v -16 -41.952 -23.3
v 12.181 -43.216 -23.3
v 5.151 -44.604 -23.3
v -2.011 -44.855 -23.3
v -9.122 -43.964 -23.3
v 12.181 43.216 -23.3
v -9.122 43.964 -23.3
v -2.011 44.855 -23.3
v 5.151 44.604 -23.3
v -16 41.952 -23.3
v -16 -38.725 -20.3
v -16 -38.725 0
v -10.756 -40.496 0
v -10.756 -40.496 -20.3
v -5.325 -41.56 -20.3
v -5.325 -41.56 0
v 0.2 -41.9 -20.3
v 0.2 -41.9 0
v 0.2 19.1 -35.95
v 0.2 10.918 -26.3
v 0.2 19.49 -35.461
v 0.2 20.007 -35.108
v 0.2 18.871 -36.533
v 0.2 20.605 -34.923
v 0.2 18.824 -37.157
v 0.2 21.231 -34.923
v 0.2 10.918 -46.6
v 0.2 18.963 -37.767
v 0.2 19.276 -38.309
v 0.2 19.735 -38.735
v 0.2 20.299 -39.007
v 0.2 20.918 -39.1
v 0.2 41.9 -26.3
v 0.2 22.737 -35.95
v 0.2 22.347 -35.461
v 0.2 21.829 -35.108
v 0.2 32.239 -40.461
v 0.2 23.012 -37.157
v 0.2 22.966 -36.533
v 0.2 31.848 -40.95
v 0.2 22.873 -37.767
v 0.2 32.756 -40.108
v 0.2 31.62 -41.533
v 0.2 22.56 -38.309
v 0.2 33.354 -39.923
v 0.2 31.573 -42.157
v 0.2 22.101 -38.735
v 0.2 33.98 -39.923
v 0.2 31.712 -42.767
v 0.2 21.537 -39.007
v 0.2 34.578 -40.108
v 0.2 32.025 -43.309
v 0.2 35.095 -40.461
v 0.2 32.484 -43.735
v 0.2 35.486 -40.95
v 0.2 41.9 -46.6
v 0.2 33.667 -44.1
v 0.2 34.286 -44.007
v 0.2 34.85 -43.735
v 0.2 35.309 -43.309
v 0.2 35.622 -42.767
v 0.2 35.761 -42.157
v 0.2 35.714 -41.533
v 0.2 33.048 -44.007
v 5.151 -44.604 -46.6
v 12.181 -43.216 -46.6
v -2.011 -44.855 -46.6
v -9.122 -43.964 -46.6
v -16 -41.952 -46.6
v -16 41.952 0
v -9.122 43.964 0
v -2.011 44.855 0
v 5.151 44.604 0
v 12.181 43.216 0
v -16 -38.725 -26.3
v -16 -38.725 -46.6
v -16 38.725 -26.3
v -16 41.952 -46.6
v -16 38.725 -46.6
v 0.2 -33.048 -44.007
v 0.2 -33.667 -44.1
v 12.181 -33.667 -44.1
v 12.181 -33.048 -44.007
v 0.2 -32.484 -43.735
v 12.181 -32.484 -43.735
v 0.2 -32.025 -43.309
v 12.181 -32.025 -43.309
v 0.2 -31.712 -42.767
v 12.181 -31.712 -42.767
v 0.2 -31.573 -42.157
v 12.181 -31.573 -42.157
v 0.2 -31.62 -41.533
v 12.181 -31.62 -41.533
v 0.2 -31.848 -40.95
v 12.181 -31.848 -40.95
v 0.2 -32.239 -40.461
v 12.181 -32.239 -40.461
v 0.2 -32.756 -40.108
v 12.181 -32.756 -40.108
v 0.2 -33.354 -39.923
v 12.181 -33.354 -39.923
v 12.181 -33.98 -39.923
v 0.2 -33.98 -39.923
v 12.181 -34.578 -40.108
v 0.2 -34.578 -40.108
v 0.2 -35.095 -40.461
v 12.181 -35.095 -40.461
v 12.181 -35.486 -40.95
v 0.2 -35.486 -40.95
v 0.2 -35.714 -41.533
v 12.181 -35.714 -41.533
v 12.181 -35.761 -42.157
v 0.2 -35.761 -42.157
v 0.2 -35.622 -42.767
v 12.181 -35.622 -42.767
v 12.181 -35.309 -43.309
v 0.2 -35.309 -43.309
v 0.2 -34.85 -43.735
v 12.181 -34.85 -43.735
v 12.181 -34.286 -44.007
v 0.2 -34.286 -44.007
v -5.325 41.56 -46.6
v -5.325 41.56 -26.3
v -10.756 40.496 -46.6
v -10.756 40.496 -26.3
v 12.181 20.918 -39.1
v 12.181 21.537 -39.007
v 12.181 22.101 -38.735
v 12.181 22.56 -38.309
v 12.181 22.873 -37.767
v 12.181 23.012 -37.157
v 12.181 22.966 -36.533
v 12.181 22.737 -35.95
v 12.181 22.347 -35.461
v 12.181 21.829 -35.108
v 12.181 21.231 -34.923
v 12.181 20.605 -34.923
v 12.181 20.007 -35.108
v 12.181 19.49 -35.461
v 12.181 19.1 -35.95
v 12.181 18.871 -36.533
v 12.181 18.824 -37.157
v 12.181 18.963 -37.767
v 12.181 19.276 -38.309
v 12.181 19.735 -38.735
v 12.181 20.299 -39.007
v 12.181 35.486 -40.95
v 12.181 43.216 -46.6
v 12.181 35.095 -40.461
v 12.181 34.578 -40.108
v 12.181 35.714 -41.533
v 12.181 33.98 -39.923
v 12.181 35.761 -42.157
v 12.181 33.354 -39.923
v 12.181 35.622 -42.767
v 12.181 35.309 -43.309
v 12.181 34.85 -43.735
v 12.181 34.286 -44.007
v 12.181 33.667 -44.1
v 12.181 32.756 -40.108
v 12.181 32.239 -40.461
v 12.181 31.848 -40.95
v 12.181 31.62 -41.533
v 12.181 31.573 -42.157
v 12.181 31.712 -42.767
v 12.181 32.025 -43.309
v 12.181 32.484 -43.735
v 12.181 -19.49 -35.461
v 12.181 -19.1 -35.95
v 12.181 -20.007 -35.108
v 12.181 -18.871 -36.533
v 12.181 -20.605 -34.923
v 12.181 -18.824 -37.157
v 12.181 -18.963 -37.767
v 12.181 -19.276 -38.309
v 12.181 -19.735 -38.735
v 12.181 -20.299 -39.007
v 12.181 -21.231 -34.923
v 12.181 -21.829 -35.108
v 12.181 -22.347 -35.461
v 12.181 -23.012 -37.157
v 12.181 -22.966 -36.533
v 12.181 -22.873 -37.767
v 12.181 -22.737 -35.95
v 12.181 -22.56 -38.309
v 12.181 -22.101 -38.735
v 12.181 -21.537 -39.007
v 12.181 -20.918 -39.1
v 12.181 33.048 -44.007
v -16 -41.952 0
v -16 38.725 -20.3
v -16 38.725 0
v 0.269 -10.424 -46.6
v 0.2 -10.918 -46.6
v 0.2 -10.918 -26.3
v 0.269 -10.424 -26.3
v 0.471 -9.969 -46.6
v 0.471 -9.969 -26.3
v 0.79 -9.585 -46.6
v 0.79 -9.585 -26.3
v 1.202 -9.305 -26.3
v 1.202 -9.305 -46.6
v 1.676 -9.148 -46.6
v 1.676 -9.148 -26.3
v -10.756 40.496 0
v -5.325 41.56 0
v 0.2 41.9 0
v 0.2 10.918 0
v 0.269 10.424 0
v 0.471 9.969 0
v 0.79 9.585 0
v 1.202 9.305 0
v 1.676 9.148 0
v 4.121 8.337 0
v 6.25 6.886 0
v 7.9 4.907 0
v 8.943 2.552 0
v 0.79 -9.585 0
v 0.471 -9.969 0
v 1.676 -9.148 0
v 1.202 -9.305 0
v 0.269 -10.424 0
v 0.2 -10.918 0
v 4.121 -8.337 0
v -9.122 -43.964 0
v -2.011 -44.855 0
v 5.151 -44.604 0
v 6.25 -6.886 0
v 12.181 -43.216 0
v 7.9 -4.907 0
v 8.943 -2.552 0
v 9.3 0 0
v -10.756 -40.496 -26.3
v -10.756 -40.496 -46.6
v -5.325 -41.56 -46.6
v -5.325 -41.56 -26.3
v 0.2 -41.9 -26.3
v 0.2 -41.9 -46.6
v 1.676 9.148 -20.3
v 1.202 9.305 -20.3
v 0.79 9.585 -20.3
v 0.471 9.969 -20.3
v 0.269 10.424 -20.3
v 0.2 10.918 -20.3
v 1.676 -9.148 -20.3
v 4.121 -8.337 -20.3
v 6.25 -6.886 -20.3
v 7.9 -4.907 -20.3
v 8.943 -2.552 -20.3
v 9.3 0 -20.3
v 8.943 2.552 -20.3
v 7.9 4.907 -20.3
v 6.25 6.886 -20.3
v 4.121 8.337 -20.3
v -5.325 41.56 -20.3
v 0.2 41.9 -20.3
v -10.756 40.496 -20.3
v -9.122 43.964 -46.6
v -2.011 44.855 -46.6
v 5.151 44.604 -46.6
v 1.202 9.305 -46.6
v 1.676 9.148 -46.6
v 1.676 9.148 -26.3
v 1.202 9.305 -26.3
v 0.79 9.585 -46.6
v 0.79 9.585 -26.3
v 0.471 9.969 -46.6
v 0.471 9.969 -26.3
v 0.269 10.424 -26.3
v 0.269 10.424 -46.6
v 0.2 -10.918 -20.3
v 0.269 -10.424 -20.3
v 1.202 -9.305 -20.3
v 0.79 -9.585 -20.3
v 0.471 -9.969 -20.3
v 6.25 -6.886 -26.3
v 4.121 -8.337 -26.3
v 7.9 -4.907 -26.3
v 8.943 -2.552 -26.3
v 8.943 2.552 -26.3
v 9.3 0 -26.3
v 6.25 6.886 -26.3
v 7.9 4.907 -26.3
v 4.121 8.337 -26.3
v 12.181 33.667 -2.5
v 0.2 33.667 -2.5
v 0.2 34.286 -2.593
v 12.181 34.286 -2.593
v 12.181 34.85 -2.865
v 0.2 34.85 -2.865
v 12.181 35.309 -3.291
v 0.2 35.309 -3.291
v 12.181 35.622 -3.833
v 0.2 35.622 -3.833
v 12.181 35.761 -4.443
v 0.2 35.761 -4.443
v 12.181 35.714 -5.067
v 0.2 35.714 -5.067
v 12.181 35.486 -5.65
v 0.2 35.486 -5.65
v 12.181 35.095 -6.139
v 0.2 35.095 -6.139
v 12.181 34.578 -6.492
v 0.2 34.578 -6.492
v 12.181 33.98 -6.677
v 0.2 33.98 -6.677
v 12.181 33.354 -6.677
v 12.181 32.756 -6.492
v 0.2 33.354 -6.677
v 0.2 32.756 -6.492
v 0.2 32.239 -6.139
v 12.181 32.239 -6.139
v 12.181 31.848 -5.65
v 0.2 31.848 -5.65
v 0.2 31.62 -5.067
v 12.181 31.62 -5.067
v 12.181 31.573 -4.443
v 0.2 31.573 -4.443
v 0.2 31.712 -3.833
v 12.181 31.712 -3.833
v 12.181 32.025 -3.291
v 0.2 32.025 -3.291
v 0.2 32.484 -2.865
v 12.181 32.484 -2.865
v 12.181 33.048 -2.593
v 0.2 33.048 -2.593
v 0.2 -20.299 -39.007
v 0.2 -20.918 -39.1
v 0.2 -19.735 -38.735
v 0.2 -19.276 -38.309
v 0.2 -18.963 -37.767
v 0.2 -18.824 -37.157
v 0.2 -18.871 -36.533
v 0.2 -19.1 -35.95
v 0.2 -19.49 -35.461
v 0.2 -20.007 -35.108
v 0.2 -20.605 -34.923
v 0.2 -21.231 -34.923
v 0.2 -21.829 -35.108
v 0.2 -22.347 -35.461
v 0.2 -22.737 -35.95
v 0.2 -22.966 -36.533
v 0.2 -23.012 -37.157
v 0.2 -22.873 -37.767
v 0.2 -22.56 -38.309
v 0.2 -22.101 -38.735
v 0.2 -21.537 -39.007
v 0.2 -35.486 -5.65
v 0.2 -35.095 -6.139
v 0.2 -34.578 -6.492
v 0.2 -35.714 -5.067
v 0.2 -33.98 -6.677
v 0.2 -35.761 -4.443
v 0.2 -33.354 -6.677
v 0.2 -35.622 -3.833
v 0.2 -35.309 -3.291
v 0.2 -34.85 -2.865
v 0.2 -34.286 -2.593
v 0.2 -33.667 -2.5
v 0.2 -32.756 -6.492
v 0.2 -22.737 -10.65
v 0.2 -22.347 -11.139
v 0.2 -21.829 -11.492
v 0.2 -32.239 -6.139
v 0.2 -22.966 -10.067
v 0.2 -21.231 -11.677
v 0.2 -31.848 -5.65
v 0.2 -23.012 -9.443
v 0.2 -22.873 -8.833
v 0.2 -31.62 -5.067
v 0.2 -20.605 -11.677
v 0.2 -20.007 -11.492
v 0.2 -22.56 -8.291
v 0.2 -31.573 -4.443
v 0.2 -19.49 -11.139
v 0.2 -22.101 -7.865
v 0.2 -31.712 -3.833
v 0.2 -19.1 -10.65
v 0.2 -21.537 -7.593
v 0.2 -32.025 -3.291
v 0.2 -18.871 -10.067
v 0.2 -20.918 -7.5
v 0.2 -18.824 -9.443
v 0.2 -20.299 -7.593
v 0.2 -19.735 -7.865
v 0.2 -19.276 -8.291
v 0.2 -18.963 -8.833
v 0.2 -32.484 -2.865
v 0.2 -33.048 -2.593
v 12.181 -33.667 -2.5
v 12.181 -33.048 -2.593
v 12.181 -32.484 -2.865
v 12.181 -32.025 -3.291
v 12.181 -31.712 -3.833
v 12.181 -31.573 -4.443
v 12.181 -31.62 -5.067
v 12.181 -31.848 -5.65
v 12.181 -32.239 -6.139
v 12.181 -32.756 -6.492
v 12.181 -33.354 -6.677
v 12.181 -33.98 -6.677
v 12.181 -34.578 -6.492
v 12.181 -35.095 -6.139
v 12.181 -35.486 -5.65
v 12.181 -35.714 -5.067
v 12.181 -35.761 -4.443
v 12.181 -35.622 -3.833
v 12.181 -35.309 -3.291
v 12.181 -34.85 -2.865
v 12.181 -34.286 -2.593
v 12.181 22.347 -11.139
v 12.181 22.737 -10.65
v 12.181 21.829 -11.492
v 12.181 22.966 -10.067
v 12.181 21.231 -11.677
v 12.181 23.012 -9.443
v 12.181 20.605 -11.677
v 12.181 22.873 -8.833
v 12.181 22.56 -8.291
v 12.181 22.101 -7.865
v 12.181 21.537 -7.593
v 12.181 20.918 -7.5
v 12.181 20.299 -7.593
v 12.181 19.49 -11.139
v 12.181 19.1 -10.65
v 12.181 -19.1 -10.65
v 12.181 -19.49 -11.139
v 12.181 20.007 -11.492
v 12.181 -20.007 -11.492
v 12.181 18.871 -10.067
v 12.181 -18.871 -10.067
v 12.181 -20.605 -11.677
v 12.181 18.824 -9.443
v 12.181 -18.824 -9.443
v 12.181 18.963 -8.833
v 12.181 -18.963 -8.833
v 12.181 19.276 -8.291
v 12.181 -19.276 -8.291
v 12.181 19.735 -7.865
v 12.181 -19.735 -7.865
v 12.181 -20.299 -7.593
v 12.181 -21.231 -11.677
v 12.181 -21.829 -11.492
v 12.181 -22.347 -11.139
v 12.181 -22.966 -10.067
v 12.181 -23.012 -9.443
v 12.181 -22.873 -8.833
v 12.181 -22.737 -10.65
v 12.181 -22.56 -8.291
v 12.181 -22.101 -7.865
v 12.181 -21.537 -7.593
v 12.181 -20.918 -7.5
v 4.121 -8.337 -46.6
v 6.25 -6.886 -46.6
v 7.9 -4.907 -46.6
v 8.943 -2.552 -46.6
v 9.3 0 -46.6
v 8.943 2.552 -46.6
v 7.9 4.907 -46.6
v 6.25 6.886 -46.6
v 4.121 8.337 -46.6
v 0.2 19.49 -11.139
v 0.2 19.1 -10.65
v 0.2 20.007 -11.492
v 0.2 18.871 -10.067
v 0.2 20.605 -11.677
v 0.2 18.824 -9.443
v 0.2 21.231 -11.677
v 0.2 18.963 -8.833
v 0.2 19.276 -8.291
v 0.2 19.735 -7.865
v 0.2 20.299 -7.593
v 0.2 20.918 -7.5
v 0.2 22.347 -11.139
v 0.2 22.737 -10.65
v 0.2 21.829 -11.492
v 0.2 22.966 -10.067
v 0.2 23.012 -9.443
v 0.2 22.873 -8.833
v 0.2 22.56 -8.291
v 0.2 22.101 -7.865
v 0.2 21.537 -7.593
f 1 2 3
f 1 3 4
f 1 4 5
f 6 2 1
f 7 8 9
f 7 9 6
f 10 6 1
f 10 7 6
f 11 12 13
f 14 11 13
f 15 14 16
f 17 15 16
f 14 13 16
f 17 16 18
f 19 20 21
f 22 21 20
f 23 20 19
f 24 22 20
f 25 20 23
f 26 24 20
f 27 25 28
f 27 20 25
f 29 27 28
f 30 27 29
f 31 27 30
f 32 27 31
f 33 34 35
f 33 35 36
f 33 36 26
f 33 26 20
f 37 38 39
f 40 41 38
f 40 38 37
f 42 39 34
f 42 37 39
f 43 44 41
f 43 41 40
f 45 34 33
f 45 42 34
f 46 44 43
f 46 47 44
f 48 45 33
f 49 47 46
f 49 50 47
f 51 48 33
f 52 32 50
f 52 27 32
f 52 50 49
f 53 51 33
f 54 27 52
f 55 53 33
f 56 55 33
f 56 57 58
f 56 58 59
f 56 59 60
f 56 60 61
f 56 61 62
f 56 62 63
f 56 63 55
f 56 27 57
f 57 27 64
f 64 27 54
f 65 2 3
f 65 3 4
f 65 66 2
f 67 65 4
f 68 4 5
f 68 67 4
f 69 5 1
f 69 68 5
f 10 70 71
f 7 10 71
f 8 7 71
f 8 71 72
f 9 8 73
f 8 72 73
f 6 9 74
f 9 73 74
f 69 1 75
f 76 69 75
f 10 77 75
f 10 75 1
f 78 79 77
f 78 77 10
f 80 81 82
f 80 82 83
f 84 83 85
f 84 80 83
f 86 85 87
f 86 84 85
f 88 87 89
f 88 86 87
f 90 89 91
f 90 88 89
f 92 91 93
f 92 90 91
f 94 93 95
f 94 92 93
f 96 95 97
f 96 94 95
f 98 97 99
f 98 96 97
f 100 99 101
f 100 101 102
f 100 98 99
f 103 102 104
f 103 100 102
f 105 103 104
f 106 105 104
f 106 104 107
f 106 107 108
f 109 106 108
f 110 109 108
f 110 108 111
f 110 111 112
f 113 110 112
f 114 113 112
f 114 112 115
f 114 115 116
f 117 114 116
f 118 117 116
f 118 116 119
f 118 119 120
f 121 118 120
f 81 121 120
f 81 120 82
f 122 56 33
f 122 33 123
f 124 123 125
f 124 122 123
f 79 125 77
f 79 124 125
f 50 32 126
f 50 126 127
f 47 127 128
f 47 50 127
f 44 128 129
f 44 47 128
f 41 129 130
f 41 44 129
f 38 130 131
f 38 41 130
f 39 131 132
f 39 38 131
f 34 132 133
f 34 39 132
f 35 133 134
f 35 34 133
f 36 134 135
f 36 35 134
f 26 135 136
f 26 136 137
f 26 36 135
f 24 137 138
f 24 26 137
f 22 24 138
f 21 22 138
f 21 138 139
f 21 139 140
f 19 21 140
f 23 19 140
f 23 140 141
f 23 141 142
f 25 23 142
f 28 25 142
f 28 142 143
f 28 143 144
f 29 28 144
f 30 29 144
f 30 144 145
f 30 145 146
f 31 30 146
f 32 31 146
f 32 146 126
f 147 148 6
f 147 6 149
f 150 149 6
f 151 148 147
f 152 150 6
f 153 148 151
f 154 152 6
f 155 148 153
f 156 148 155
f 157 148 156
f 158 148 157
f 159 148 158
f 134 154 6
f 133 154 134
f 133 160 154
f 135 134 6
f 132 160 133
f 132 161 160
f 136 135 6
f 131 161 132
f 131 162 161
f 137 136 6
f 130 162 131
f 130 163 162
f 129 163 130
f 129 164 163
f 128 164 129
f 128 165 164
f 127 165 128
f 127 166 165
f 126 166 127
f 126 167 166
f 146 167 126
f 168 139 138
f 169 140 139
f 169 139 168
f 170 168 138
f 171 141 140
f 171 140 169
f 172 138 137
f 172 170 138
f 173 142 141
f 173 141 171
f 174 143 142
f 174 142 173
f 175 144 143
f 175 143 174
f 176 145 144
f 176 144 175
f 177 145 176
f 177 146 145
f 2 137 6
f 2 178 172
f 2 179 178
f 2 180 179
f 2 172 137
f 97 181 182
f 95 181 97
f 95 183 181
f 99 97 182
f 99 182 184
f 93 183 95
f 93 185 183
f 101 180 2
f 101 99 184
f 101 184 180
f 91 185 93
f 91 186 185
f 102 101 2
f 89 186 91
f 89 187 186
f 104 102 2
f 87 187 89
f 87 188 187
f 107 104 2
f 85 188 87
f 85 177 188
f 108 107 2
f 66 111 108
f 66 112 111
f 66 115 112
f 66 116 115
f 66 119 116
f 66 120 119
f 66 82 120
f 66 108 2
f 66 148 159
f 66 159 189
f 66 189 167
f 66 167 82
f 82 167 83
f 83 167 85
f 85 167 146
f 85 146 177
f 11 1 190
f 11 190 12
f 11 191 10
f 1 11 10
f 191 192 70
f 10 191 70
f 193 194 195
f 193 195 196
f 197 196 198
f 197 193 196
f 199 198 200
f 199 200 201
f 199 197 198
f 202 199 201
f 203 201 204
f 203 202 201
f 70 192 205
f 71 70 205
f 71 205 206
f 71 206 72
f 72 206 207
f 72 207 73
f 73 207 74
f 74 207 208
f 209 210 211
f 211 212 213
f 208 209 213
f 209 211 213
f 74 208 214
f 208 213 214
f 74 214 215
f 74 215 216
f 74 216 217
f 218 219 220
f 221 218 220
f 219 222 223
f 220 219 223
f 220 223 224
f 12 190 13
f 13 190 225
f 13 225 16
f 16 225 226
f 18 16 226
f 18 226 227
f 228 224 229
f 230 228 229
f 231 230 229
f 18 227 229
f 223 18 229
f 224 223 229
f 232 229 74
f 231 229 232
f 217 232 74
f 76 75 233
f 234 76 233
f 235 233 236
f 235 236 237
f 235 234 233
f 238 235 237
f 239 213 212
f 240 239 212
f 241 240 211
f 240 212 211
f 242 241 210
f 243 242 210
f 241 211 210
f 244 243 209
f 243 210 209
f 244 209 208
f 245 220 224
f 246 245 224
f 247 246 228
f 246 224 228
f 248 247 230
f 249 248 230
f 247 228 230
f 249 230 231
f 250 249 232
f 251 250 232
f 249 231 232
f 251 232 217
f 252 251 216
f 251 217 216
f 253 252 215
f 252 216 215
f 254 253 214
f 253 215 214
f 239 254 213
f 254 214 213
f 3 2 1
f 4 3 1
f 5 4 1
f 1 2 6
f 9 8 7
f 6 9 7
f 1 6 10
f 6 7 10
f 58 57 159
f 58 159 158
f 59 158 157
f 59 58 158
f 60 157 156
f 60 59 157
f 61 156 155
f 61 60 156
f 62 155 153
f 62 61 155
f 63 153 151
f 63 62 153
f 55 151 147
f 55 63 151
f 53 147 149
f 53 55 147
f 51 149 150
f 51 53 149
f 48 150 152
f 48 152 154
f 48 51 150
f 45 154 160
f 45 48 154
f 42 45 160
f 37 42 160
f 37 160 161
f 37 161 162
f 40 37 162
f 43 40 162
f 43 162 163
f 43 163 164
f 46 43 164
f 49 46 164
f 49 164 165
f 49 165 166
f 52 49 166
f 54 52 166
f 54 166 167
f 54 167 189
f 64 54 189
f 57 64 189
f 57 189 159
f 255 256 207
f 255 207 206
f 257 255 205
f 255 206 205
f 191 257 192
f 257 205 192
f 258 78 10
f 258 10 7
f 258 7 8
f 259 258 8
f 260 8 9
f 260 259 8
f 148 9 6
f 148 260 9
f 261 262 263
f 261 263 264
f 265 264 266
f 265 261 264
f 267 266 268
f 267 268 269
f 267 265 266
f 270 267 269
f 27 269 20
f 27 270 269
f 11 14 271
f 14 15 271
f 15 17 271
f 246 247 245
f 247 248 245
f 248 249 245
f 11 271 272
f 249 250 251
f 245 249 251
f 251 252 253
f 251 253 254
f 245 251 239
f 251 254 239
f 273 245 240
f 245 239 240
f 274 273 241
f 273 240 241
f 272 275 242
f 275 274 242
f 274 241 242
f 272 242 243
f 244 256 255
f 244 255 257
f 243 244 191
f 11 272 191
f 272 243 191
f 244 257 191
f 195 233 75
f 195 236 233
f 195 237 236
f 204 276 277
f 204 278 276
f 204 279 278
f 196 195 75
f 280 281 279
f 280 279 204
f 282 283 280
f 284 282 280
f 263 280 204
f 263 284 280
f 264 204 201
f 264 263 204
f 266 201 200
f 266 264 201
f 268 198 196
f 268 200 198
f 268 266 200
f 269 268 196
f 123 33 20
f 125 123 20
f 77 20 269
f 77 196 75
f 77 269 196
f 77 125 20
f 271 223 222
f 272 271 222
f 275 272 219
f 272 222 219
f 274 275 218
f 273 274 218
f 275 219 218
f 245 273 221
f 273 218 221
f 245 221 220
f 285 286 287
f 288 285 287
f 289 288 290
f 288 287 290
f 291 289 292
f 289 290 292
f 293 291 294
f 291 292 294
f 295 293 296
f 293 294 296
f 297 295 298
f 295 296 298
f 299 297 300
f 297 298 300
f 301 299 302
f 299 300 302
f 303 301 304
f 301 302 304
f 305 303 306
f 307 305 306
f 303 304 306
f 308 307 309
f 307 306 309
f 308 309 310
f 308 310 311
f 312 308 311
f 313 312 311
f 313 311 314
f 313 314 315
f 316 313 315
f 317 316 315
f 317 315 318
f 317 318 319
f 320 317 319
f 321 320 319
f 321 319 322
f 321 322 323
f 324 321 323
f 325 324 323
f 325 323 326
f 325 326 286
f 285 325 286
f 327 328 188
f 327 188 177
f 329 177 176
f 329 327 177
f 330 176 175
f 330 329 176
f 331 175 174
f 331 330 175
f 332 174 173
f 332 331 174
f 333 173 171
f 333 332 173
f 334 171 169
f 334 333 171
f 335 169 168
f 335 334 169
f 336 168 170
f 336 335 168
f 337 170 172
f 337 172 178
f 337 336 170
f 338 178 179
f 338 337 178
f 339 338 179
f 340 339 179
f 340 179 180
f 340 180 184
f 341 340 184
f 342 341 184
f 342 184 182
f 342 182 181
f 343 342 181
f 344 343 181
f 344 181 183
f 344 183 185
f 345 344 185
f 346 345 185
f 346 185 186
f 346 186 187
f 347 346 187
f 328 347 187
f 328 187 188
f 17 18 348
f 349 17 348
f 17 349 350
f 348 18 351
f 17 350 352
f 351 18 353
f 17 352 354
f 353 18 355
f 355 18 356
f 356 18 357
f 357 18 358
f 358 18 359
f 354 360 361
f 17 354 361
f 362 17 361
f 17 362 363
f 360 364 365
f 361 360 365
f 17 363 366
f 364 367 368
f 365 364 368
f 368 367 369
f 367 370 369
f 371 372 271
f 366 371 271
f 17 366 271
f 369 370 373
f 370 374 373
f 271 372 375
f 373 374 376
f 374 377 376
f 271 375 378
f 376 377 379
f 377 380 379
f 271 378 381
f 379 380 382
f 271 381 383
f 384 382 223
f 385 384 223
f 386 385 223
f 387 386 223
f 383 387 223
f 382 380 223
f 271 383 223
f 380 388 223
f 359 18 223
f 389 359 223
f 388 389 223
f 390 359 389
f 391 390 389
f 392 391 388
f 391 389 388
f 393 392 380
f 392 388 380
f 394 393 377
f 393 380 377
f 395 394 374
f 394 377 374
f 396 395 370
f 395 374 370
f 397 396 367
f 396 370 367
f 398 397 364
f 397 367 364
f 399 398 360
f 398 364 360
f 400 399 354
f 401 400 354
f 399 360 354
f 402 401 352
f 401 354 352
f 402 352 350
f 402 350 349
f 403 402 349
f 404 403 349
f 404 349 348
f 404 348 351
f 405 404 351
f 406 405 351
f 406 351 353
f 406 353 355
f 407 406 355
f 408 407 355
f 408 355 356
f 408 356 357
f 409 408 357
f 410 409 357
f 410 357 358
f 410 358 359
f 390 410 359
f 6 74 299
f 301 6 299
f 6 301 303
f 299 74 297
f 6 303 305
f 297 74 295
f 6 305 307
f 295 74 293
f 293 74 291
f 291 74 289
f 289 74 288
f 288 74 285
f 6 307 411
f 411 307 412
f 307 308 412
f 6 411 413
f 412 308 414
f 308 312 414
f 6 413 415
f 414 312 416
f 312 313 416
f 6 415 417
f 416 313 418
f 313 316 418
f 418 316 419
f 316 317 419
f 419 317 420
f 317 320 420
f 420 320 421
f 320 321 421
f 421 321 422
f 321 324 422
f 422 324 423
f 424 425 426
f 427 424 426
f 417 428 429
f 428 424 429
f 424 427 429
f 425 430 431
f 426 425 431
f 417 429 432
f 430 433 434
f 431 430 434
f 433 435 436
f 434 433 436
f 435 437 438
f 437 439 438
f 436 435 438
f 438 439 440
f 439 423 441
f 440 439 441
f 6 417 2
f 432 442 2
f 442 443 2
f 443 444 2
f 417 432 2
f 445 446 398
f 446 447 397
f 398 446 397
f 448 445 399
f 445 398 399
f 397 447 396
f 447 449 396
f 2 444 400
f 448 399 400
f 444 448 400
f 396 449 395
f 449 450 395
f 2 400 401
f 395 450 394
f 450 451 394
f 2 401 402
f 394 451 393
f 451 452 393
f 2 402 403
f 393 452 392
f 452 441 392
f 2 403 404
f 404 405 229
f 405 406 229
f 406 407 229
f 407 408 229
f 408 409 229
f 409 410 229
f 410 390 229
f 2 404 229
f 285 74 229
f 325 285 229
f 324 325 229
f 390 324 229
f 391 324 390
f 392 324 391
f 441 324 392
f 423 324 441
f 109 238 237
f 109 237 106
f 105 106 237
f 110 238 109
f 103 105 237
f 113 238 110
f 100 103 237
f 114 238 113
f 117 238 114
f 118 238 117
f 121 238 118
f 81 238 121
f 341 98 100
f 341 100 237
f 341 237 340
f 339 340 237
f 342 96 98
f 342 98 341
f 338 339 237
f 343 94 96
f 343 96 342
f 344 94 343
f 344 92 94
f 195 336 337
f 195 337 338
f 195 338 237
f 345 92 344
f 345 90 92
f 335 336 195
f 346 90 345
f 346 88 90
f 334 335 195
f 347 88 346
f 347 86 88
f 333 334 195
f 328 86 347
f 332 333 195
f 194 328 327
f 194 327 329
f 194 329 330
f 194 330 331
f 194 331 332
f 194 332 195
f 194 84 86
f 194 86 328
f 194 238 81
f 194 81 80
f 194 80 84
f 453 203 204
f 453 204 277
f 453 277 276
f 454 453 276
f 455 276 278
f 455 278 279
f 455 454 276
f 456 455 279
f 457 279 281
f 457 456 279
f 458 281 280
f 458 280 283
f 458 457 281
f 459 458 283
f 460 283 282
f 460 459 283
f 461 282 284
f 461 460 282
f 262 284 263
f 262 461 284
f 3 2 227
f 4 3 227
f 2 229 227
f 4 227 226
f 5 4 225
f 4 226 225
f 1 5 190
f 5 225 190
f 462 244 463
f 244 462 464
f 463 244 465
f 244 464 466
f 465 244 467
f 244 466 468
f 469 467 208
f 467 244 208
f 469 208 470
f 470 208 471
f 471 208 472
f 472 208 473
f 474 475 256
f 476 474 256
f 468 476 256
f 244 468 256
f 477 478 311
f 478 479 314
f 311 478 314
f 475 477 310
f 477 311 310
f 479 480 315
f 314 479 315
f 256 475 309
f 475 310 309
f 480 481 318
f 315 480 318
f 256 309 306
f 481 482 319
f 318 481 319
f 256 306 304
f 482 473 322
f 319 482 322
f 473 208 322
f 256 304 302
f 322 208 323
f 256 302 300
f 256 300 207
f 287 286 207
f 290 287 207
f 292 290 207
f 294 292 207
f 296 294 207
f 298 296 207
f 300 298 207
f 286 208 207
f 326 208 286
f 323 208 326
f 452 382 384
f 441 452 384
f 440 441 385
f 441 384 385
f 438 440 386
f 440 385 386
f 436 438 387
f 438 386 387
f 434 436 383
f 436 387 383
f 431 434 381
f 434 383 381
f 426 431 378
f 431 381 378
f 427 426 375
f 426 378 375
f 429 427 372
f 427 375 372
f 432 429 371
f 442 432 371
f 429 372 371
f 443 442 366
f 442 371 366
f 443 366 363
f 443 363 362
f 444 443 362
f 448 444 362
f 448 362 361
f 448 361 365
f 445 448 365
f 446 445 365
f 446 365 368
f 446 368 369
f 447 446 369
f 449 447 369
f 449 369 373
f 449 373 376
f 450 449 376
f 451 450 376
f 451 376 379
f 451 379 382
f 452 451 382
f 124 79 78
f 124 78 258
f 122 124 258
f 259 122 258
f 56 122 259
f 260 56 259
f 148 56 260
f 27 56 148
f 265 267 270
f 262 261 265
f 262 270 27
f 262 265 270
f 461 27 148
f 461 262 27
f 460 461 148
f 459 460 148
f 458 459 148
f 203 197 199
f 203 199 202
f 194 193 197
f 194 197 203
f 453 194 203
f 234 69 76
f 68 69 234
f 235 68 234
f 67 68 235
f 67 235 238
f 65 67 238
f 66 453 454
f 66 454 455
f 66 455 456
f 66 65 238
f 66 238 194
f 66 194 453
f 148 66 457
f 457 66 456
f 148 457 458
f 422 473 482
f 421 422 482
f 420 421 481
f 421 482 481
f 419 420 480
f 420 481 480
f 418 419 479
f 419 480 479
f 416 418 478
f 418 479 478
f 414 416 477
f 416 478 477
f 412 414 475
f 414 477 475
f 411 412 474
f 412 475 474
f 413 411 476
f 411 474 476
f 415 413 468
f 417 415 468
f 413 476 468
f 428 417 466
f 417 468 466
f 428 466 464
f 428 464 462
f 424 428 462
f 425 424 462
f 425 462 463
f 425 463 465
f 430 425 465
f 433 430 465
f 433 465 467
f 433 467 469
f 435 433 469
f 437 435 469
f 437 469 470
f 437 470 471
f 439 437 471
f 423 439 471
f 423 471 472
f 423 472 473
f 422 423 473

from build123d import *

# Parameters (mm, degrees)
EXTRUDE_1_DEPTH     = 20.3
SKETCH_5_R          = 2.1
CUT_EXTRUDE_1_DEPTH = 52.87041546
EXTRUDE_2_DEPTH     = 3


with BuildPart() as part:
    # 草图2 → 凸台-拉伸1 (new body)
    with BuildSketch(Plane(origin=(0, 0, 0), x_dir=(-1, 0, 0), z_dir=(0, 0, 1))):
        with BuildLine():
            Line((-0.2, 41.5), (-0.2, 10.918333206))
            ThreePointArc((-0.2, 10.918333206), (-0.617288211, 9.765897478), (-1.675675676, 9.147792686))
            ThreePointArc((-1.675675676, 9.147792686), (-9.3, 0), (-1.675675676, -9.147792686))
            ThreePointArc((-1.675675676, -9.147792686), (-0.617288211, -9.765897478), (-0.2, -10.918333206))
            Line((-0.2, -10.918333206), (-0.2, -41.5))
            Line((-0.2, -41.5), (-0.2, -41.89952267))
            ThreePointArc((-0.2, -41.89952267), (8.057897913, -41.117882742), (16, -38.724798256))
            Line((16, -38.724798256), (16, -41.952473109))
            ThreePointArc((16, -41.952473109), (2.011178974, -44.854934613), (-12.18126433, -43.216047937))
            Line((-12.18126433, -43.216047937), (-12.18126433, 43.216047937))
            ThreePointArc((-12.18126433, 43.216047937), (2.011178974, 44.854934613), (16, 41.952473109))
            Line((16, 41.952473109), (16, 38.724798256))
            ThreePointArc((16, 38.724798256), (8.057897913, 41.117882742), (-0.2, 41.89952267))
            Line((-0.2, 41.89952267), (-0.2, 41.5))
        make_face()
    extrude(amount=-EXTRUDE_1_DEPTH)

    # 草图5 → 切除-拉伸1 (cut, through all)
    with BuildSketch(Plane.ZY.offset(-0.2)):
        with Locations((-4.6, 33.667083302)):
            Circle(SKETCH_5_R)
        with Locations((-9.6, 20.918333206)):
            Circle(SKETCH_5_R)
        with Locations((-9.6, -20.918333206)):
            Circle(SKETCH_5_R)
        with Locations((-4.6, -33.667083302)):
            Circle(SKETCH_5_R)
    extrude(amount=-CUT_EXTRUDE_1_DEPTH, mode=Mode.SUBTRACT)

    # 草图7 → 凸台-拉伸2 (add)
    with BuildSketch(Plane(origin=(0, 0, -20.3), x_dir=(-1, 0, 0), z_dir=(0, 0, -1))):
        with BuildLine():
            Line((-12.18126433, 43.216047937), (-12.18126433, -43.216047937))
            ThreePointArc((-12.18126433, -43.216047937), (2.011178974, -44.854934613), (16, -41.952473109))
            Line((16, -41.952473109), (16, 41.952473109))
            ThreePointArc((16, 41.952473109), (2.011178974, 44.854934613), (-12.18126433, 43.216047937))
        make_face()
    extrude(amount=EXTRUDE_2_DEPTH)


with BuildPart() as body_2:
    # 镜向2: mirrored copy
    add(part.part.mirror(Plane.XY.offset(-23.3)))


solid = Compound([part.part, body_2.part])
